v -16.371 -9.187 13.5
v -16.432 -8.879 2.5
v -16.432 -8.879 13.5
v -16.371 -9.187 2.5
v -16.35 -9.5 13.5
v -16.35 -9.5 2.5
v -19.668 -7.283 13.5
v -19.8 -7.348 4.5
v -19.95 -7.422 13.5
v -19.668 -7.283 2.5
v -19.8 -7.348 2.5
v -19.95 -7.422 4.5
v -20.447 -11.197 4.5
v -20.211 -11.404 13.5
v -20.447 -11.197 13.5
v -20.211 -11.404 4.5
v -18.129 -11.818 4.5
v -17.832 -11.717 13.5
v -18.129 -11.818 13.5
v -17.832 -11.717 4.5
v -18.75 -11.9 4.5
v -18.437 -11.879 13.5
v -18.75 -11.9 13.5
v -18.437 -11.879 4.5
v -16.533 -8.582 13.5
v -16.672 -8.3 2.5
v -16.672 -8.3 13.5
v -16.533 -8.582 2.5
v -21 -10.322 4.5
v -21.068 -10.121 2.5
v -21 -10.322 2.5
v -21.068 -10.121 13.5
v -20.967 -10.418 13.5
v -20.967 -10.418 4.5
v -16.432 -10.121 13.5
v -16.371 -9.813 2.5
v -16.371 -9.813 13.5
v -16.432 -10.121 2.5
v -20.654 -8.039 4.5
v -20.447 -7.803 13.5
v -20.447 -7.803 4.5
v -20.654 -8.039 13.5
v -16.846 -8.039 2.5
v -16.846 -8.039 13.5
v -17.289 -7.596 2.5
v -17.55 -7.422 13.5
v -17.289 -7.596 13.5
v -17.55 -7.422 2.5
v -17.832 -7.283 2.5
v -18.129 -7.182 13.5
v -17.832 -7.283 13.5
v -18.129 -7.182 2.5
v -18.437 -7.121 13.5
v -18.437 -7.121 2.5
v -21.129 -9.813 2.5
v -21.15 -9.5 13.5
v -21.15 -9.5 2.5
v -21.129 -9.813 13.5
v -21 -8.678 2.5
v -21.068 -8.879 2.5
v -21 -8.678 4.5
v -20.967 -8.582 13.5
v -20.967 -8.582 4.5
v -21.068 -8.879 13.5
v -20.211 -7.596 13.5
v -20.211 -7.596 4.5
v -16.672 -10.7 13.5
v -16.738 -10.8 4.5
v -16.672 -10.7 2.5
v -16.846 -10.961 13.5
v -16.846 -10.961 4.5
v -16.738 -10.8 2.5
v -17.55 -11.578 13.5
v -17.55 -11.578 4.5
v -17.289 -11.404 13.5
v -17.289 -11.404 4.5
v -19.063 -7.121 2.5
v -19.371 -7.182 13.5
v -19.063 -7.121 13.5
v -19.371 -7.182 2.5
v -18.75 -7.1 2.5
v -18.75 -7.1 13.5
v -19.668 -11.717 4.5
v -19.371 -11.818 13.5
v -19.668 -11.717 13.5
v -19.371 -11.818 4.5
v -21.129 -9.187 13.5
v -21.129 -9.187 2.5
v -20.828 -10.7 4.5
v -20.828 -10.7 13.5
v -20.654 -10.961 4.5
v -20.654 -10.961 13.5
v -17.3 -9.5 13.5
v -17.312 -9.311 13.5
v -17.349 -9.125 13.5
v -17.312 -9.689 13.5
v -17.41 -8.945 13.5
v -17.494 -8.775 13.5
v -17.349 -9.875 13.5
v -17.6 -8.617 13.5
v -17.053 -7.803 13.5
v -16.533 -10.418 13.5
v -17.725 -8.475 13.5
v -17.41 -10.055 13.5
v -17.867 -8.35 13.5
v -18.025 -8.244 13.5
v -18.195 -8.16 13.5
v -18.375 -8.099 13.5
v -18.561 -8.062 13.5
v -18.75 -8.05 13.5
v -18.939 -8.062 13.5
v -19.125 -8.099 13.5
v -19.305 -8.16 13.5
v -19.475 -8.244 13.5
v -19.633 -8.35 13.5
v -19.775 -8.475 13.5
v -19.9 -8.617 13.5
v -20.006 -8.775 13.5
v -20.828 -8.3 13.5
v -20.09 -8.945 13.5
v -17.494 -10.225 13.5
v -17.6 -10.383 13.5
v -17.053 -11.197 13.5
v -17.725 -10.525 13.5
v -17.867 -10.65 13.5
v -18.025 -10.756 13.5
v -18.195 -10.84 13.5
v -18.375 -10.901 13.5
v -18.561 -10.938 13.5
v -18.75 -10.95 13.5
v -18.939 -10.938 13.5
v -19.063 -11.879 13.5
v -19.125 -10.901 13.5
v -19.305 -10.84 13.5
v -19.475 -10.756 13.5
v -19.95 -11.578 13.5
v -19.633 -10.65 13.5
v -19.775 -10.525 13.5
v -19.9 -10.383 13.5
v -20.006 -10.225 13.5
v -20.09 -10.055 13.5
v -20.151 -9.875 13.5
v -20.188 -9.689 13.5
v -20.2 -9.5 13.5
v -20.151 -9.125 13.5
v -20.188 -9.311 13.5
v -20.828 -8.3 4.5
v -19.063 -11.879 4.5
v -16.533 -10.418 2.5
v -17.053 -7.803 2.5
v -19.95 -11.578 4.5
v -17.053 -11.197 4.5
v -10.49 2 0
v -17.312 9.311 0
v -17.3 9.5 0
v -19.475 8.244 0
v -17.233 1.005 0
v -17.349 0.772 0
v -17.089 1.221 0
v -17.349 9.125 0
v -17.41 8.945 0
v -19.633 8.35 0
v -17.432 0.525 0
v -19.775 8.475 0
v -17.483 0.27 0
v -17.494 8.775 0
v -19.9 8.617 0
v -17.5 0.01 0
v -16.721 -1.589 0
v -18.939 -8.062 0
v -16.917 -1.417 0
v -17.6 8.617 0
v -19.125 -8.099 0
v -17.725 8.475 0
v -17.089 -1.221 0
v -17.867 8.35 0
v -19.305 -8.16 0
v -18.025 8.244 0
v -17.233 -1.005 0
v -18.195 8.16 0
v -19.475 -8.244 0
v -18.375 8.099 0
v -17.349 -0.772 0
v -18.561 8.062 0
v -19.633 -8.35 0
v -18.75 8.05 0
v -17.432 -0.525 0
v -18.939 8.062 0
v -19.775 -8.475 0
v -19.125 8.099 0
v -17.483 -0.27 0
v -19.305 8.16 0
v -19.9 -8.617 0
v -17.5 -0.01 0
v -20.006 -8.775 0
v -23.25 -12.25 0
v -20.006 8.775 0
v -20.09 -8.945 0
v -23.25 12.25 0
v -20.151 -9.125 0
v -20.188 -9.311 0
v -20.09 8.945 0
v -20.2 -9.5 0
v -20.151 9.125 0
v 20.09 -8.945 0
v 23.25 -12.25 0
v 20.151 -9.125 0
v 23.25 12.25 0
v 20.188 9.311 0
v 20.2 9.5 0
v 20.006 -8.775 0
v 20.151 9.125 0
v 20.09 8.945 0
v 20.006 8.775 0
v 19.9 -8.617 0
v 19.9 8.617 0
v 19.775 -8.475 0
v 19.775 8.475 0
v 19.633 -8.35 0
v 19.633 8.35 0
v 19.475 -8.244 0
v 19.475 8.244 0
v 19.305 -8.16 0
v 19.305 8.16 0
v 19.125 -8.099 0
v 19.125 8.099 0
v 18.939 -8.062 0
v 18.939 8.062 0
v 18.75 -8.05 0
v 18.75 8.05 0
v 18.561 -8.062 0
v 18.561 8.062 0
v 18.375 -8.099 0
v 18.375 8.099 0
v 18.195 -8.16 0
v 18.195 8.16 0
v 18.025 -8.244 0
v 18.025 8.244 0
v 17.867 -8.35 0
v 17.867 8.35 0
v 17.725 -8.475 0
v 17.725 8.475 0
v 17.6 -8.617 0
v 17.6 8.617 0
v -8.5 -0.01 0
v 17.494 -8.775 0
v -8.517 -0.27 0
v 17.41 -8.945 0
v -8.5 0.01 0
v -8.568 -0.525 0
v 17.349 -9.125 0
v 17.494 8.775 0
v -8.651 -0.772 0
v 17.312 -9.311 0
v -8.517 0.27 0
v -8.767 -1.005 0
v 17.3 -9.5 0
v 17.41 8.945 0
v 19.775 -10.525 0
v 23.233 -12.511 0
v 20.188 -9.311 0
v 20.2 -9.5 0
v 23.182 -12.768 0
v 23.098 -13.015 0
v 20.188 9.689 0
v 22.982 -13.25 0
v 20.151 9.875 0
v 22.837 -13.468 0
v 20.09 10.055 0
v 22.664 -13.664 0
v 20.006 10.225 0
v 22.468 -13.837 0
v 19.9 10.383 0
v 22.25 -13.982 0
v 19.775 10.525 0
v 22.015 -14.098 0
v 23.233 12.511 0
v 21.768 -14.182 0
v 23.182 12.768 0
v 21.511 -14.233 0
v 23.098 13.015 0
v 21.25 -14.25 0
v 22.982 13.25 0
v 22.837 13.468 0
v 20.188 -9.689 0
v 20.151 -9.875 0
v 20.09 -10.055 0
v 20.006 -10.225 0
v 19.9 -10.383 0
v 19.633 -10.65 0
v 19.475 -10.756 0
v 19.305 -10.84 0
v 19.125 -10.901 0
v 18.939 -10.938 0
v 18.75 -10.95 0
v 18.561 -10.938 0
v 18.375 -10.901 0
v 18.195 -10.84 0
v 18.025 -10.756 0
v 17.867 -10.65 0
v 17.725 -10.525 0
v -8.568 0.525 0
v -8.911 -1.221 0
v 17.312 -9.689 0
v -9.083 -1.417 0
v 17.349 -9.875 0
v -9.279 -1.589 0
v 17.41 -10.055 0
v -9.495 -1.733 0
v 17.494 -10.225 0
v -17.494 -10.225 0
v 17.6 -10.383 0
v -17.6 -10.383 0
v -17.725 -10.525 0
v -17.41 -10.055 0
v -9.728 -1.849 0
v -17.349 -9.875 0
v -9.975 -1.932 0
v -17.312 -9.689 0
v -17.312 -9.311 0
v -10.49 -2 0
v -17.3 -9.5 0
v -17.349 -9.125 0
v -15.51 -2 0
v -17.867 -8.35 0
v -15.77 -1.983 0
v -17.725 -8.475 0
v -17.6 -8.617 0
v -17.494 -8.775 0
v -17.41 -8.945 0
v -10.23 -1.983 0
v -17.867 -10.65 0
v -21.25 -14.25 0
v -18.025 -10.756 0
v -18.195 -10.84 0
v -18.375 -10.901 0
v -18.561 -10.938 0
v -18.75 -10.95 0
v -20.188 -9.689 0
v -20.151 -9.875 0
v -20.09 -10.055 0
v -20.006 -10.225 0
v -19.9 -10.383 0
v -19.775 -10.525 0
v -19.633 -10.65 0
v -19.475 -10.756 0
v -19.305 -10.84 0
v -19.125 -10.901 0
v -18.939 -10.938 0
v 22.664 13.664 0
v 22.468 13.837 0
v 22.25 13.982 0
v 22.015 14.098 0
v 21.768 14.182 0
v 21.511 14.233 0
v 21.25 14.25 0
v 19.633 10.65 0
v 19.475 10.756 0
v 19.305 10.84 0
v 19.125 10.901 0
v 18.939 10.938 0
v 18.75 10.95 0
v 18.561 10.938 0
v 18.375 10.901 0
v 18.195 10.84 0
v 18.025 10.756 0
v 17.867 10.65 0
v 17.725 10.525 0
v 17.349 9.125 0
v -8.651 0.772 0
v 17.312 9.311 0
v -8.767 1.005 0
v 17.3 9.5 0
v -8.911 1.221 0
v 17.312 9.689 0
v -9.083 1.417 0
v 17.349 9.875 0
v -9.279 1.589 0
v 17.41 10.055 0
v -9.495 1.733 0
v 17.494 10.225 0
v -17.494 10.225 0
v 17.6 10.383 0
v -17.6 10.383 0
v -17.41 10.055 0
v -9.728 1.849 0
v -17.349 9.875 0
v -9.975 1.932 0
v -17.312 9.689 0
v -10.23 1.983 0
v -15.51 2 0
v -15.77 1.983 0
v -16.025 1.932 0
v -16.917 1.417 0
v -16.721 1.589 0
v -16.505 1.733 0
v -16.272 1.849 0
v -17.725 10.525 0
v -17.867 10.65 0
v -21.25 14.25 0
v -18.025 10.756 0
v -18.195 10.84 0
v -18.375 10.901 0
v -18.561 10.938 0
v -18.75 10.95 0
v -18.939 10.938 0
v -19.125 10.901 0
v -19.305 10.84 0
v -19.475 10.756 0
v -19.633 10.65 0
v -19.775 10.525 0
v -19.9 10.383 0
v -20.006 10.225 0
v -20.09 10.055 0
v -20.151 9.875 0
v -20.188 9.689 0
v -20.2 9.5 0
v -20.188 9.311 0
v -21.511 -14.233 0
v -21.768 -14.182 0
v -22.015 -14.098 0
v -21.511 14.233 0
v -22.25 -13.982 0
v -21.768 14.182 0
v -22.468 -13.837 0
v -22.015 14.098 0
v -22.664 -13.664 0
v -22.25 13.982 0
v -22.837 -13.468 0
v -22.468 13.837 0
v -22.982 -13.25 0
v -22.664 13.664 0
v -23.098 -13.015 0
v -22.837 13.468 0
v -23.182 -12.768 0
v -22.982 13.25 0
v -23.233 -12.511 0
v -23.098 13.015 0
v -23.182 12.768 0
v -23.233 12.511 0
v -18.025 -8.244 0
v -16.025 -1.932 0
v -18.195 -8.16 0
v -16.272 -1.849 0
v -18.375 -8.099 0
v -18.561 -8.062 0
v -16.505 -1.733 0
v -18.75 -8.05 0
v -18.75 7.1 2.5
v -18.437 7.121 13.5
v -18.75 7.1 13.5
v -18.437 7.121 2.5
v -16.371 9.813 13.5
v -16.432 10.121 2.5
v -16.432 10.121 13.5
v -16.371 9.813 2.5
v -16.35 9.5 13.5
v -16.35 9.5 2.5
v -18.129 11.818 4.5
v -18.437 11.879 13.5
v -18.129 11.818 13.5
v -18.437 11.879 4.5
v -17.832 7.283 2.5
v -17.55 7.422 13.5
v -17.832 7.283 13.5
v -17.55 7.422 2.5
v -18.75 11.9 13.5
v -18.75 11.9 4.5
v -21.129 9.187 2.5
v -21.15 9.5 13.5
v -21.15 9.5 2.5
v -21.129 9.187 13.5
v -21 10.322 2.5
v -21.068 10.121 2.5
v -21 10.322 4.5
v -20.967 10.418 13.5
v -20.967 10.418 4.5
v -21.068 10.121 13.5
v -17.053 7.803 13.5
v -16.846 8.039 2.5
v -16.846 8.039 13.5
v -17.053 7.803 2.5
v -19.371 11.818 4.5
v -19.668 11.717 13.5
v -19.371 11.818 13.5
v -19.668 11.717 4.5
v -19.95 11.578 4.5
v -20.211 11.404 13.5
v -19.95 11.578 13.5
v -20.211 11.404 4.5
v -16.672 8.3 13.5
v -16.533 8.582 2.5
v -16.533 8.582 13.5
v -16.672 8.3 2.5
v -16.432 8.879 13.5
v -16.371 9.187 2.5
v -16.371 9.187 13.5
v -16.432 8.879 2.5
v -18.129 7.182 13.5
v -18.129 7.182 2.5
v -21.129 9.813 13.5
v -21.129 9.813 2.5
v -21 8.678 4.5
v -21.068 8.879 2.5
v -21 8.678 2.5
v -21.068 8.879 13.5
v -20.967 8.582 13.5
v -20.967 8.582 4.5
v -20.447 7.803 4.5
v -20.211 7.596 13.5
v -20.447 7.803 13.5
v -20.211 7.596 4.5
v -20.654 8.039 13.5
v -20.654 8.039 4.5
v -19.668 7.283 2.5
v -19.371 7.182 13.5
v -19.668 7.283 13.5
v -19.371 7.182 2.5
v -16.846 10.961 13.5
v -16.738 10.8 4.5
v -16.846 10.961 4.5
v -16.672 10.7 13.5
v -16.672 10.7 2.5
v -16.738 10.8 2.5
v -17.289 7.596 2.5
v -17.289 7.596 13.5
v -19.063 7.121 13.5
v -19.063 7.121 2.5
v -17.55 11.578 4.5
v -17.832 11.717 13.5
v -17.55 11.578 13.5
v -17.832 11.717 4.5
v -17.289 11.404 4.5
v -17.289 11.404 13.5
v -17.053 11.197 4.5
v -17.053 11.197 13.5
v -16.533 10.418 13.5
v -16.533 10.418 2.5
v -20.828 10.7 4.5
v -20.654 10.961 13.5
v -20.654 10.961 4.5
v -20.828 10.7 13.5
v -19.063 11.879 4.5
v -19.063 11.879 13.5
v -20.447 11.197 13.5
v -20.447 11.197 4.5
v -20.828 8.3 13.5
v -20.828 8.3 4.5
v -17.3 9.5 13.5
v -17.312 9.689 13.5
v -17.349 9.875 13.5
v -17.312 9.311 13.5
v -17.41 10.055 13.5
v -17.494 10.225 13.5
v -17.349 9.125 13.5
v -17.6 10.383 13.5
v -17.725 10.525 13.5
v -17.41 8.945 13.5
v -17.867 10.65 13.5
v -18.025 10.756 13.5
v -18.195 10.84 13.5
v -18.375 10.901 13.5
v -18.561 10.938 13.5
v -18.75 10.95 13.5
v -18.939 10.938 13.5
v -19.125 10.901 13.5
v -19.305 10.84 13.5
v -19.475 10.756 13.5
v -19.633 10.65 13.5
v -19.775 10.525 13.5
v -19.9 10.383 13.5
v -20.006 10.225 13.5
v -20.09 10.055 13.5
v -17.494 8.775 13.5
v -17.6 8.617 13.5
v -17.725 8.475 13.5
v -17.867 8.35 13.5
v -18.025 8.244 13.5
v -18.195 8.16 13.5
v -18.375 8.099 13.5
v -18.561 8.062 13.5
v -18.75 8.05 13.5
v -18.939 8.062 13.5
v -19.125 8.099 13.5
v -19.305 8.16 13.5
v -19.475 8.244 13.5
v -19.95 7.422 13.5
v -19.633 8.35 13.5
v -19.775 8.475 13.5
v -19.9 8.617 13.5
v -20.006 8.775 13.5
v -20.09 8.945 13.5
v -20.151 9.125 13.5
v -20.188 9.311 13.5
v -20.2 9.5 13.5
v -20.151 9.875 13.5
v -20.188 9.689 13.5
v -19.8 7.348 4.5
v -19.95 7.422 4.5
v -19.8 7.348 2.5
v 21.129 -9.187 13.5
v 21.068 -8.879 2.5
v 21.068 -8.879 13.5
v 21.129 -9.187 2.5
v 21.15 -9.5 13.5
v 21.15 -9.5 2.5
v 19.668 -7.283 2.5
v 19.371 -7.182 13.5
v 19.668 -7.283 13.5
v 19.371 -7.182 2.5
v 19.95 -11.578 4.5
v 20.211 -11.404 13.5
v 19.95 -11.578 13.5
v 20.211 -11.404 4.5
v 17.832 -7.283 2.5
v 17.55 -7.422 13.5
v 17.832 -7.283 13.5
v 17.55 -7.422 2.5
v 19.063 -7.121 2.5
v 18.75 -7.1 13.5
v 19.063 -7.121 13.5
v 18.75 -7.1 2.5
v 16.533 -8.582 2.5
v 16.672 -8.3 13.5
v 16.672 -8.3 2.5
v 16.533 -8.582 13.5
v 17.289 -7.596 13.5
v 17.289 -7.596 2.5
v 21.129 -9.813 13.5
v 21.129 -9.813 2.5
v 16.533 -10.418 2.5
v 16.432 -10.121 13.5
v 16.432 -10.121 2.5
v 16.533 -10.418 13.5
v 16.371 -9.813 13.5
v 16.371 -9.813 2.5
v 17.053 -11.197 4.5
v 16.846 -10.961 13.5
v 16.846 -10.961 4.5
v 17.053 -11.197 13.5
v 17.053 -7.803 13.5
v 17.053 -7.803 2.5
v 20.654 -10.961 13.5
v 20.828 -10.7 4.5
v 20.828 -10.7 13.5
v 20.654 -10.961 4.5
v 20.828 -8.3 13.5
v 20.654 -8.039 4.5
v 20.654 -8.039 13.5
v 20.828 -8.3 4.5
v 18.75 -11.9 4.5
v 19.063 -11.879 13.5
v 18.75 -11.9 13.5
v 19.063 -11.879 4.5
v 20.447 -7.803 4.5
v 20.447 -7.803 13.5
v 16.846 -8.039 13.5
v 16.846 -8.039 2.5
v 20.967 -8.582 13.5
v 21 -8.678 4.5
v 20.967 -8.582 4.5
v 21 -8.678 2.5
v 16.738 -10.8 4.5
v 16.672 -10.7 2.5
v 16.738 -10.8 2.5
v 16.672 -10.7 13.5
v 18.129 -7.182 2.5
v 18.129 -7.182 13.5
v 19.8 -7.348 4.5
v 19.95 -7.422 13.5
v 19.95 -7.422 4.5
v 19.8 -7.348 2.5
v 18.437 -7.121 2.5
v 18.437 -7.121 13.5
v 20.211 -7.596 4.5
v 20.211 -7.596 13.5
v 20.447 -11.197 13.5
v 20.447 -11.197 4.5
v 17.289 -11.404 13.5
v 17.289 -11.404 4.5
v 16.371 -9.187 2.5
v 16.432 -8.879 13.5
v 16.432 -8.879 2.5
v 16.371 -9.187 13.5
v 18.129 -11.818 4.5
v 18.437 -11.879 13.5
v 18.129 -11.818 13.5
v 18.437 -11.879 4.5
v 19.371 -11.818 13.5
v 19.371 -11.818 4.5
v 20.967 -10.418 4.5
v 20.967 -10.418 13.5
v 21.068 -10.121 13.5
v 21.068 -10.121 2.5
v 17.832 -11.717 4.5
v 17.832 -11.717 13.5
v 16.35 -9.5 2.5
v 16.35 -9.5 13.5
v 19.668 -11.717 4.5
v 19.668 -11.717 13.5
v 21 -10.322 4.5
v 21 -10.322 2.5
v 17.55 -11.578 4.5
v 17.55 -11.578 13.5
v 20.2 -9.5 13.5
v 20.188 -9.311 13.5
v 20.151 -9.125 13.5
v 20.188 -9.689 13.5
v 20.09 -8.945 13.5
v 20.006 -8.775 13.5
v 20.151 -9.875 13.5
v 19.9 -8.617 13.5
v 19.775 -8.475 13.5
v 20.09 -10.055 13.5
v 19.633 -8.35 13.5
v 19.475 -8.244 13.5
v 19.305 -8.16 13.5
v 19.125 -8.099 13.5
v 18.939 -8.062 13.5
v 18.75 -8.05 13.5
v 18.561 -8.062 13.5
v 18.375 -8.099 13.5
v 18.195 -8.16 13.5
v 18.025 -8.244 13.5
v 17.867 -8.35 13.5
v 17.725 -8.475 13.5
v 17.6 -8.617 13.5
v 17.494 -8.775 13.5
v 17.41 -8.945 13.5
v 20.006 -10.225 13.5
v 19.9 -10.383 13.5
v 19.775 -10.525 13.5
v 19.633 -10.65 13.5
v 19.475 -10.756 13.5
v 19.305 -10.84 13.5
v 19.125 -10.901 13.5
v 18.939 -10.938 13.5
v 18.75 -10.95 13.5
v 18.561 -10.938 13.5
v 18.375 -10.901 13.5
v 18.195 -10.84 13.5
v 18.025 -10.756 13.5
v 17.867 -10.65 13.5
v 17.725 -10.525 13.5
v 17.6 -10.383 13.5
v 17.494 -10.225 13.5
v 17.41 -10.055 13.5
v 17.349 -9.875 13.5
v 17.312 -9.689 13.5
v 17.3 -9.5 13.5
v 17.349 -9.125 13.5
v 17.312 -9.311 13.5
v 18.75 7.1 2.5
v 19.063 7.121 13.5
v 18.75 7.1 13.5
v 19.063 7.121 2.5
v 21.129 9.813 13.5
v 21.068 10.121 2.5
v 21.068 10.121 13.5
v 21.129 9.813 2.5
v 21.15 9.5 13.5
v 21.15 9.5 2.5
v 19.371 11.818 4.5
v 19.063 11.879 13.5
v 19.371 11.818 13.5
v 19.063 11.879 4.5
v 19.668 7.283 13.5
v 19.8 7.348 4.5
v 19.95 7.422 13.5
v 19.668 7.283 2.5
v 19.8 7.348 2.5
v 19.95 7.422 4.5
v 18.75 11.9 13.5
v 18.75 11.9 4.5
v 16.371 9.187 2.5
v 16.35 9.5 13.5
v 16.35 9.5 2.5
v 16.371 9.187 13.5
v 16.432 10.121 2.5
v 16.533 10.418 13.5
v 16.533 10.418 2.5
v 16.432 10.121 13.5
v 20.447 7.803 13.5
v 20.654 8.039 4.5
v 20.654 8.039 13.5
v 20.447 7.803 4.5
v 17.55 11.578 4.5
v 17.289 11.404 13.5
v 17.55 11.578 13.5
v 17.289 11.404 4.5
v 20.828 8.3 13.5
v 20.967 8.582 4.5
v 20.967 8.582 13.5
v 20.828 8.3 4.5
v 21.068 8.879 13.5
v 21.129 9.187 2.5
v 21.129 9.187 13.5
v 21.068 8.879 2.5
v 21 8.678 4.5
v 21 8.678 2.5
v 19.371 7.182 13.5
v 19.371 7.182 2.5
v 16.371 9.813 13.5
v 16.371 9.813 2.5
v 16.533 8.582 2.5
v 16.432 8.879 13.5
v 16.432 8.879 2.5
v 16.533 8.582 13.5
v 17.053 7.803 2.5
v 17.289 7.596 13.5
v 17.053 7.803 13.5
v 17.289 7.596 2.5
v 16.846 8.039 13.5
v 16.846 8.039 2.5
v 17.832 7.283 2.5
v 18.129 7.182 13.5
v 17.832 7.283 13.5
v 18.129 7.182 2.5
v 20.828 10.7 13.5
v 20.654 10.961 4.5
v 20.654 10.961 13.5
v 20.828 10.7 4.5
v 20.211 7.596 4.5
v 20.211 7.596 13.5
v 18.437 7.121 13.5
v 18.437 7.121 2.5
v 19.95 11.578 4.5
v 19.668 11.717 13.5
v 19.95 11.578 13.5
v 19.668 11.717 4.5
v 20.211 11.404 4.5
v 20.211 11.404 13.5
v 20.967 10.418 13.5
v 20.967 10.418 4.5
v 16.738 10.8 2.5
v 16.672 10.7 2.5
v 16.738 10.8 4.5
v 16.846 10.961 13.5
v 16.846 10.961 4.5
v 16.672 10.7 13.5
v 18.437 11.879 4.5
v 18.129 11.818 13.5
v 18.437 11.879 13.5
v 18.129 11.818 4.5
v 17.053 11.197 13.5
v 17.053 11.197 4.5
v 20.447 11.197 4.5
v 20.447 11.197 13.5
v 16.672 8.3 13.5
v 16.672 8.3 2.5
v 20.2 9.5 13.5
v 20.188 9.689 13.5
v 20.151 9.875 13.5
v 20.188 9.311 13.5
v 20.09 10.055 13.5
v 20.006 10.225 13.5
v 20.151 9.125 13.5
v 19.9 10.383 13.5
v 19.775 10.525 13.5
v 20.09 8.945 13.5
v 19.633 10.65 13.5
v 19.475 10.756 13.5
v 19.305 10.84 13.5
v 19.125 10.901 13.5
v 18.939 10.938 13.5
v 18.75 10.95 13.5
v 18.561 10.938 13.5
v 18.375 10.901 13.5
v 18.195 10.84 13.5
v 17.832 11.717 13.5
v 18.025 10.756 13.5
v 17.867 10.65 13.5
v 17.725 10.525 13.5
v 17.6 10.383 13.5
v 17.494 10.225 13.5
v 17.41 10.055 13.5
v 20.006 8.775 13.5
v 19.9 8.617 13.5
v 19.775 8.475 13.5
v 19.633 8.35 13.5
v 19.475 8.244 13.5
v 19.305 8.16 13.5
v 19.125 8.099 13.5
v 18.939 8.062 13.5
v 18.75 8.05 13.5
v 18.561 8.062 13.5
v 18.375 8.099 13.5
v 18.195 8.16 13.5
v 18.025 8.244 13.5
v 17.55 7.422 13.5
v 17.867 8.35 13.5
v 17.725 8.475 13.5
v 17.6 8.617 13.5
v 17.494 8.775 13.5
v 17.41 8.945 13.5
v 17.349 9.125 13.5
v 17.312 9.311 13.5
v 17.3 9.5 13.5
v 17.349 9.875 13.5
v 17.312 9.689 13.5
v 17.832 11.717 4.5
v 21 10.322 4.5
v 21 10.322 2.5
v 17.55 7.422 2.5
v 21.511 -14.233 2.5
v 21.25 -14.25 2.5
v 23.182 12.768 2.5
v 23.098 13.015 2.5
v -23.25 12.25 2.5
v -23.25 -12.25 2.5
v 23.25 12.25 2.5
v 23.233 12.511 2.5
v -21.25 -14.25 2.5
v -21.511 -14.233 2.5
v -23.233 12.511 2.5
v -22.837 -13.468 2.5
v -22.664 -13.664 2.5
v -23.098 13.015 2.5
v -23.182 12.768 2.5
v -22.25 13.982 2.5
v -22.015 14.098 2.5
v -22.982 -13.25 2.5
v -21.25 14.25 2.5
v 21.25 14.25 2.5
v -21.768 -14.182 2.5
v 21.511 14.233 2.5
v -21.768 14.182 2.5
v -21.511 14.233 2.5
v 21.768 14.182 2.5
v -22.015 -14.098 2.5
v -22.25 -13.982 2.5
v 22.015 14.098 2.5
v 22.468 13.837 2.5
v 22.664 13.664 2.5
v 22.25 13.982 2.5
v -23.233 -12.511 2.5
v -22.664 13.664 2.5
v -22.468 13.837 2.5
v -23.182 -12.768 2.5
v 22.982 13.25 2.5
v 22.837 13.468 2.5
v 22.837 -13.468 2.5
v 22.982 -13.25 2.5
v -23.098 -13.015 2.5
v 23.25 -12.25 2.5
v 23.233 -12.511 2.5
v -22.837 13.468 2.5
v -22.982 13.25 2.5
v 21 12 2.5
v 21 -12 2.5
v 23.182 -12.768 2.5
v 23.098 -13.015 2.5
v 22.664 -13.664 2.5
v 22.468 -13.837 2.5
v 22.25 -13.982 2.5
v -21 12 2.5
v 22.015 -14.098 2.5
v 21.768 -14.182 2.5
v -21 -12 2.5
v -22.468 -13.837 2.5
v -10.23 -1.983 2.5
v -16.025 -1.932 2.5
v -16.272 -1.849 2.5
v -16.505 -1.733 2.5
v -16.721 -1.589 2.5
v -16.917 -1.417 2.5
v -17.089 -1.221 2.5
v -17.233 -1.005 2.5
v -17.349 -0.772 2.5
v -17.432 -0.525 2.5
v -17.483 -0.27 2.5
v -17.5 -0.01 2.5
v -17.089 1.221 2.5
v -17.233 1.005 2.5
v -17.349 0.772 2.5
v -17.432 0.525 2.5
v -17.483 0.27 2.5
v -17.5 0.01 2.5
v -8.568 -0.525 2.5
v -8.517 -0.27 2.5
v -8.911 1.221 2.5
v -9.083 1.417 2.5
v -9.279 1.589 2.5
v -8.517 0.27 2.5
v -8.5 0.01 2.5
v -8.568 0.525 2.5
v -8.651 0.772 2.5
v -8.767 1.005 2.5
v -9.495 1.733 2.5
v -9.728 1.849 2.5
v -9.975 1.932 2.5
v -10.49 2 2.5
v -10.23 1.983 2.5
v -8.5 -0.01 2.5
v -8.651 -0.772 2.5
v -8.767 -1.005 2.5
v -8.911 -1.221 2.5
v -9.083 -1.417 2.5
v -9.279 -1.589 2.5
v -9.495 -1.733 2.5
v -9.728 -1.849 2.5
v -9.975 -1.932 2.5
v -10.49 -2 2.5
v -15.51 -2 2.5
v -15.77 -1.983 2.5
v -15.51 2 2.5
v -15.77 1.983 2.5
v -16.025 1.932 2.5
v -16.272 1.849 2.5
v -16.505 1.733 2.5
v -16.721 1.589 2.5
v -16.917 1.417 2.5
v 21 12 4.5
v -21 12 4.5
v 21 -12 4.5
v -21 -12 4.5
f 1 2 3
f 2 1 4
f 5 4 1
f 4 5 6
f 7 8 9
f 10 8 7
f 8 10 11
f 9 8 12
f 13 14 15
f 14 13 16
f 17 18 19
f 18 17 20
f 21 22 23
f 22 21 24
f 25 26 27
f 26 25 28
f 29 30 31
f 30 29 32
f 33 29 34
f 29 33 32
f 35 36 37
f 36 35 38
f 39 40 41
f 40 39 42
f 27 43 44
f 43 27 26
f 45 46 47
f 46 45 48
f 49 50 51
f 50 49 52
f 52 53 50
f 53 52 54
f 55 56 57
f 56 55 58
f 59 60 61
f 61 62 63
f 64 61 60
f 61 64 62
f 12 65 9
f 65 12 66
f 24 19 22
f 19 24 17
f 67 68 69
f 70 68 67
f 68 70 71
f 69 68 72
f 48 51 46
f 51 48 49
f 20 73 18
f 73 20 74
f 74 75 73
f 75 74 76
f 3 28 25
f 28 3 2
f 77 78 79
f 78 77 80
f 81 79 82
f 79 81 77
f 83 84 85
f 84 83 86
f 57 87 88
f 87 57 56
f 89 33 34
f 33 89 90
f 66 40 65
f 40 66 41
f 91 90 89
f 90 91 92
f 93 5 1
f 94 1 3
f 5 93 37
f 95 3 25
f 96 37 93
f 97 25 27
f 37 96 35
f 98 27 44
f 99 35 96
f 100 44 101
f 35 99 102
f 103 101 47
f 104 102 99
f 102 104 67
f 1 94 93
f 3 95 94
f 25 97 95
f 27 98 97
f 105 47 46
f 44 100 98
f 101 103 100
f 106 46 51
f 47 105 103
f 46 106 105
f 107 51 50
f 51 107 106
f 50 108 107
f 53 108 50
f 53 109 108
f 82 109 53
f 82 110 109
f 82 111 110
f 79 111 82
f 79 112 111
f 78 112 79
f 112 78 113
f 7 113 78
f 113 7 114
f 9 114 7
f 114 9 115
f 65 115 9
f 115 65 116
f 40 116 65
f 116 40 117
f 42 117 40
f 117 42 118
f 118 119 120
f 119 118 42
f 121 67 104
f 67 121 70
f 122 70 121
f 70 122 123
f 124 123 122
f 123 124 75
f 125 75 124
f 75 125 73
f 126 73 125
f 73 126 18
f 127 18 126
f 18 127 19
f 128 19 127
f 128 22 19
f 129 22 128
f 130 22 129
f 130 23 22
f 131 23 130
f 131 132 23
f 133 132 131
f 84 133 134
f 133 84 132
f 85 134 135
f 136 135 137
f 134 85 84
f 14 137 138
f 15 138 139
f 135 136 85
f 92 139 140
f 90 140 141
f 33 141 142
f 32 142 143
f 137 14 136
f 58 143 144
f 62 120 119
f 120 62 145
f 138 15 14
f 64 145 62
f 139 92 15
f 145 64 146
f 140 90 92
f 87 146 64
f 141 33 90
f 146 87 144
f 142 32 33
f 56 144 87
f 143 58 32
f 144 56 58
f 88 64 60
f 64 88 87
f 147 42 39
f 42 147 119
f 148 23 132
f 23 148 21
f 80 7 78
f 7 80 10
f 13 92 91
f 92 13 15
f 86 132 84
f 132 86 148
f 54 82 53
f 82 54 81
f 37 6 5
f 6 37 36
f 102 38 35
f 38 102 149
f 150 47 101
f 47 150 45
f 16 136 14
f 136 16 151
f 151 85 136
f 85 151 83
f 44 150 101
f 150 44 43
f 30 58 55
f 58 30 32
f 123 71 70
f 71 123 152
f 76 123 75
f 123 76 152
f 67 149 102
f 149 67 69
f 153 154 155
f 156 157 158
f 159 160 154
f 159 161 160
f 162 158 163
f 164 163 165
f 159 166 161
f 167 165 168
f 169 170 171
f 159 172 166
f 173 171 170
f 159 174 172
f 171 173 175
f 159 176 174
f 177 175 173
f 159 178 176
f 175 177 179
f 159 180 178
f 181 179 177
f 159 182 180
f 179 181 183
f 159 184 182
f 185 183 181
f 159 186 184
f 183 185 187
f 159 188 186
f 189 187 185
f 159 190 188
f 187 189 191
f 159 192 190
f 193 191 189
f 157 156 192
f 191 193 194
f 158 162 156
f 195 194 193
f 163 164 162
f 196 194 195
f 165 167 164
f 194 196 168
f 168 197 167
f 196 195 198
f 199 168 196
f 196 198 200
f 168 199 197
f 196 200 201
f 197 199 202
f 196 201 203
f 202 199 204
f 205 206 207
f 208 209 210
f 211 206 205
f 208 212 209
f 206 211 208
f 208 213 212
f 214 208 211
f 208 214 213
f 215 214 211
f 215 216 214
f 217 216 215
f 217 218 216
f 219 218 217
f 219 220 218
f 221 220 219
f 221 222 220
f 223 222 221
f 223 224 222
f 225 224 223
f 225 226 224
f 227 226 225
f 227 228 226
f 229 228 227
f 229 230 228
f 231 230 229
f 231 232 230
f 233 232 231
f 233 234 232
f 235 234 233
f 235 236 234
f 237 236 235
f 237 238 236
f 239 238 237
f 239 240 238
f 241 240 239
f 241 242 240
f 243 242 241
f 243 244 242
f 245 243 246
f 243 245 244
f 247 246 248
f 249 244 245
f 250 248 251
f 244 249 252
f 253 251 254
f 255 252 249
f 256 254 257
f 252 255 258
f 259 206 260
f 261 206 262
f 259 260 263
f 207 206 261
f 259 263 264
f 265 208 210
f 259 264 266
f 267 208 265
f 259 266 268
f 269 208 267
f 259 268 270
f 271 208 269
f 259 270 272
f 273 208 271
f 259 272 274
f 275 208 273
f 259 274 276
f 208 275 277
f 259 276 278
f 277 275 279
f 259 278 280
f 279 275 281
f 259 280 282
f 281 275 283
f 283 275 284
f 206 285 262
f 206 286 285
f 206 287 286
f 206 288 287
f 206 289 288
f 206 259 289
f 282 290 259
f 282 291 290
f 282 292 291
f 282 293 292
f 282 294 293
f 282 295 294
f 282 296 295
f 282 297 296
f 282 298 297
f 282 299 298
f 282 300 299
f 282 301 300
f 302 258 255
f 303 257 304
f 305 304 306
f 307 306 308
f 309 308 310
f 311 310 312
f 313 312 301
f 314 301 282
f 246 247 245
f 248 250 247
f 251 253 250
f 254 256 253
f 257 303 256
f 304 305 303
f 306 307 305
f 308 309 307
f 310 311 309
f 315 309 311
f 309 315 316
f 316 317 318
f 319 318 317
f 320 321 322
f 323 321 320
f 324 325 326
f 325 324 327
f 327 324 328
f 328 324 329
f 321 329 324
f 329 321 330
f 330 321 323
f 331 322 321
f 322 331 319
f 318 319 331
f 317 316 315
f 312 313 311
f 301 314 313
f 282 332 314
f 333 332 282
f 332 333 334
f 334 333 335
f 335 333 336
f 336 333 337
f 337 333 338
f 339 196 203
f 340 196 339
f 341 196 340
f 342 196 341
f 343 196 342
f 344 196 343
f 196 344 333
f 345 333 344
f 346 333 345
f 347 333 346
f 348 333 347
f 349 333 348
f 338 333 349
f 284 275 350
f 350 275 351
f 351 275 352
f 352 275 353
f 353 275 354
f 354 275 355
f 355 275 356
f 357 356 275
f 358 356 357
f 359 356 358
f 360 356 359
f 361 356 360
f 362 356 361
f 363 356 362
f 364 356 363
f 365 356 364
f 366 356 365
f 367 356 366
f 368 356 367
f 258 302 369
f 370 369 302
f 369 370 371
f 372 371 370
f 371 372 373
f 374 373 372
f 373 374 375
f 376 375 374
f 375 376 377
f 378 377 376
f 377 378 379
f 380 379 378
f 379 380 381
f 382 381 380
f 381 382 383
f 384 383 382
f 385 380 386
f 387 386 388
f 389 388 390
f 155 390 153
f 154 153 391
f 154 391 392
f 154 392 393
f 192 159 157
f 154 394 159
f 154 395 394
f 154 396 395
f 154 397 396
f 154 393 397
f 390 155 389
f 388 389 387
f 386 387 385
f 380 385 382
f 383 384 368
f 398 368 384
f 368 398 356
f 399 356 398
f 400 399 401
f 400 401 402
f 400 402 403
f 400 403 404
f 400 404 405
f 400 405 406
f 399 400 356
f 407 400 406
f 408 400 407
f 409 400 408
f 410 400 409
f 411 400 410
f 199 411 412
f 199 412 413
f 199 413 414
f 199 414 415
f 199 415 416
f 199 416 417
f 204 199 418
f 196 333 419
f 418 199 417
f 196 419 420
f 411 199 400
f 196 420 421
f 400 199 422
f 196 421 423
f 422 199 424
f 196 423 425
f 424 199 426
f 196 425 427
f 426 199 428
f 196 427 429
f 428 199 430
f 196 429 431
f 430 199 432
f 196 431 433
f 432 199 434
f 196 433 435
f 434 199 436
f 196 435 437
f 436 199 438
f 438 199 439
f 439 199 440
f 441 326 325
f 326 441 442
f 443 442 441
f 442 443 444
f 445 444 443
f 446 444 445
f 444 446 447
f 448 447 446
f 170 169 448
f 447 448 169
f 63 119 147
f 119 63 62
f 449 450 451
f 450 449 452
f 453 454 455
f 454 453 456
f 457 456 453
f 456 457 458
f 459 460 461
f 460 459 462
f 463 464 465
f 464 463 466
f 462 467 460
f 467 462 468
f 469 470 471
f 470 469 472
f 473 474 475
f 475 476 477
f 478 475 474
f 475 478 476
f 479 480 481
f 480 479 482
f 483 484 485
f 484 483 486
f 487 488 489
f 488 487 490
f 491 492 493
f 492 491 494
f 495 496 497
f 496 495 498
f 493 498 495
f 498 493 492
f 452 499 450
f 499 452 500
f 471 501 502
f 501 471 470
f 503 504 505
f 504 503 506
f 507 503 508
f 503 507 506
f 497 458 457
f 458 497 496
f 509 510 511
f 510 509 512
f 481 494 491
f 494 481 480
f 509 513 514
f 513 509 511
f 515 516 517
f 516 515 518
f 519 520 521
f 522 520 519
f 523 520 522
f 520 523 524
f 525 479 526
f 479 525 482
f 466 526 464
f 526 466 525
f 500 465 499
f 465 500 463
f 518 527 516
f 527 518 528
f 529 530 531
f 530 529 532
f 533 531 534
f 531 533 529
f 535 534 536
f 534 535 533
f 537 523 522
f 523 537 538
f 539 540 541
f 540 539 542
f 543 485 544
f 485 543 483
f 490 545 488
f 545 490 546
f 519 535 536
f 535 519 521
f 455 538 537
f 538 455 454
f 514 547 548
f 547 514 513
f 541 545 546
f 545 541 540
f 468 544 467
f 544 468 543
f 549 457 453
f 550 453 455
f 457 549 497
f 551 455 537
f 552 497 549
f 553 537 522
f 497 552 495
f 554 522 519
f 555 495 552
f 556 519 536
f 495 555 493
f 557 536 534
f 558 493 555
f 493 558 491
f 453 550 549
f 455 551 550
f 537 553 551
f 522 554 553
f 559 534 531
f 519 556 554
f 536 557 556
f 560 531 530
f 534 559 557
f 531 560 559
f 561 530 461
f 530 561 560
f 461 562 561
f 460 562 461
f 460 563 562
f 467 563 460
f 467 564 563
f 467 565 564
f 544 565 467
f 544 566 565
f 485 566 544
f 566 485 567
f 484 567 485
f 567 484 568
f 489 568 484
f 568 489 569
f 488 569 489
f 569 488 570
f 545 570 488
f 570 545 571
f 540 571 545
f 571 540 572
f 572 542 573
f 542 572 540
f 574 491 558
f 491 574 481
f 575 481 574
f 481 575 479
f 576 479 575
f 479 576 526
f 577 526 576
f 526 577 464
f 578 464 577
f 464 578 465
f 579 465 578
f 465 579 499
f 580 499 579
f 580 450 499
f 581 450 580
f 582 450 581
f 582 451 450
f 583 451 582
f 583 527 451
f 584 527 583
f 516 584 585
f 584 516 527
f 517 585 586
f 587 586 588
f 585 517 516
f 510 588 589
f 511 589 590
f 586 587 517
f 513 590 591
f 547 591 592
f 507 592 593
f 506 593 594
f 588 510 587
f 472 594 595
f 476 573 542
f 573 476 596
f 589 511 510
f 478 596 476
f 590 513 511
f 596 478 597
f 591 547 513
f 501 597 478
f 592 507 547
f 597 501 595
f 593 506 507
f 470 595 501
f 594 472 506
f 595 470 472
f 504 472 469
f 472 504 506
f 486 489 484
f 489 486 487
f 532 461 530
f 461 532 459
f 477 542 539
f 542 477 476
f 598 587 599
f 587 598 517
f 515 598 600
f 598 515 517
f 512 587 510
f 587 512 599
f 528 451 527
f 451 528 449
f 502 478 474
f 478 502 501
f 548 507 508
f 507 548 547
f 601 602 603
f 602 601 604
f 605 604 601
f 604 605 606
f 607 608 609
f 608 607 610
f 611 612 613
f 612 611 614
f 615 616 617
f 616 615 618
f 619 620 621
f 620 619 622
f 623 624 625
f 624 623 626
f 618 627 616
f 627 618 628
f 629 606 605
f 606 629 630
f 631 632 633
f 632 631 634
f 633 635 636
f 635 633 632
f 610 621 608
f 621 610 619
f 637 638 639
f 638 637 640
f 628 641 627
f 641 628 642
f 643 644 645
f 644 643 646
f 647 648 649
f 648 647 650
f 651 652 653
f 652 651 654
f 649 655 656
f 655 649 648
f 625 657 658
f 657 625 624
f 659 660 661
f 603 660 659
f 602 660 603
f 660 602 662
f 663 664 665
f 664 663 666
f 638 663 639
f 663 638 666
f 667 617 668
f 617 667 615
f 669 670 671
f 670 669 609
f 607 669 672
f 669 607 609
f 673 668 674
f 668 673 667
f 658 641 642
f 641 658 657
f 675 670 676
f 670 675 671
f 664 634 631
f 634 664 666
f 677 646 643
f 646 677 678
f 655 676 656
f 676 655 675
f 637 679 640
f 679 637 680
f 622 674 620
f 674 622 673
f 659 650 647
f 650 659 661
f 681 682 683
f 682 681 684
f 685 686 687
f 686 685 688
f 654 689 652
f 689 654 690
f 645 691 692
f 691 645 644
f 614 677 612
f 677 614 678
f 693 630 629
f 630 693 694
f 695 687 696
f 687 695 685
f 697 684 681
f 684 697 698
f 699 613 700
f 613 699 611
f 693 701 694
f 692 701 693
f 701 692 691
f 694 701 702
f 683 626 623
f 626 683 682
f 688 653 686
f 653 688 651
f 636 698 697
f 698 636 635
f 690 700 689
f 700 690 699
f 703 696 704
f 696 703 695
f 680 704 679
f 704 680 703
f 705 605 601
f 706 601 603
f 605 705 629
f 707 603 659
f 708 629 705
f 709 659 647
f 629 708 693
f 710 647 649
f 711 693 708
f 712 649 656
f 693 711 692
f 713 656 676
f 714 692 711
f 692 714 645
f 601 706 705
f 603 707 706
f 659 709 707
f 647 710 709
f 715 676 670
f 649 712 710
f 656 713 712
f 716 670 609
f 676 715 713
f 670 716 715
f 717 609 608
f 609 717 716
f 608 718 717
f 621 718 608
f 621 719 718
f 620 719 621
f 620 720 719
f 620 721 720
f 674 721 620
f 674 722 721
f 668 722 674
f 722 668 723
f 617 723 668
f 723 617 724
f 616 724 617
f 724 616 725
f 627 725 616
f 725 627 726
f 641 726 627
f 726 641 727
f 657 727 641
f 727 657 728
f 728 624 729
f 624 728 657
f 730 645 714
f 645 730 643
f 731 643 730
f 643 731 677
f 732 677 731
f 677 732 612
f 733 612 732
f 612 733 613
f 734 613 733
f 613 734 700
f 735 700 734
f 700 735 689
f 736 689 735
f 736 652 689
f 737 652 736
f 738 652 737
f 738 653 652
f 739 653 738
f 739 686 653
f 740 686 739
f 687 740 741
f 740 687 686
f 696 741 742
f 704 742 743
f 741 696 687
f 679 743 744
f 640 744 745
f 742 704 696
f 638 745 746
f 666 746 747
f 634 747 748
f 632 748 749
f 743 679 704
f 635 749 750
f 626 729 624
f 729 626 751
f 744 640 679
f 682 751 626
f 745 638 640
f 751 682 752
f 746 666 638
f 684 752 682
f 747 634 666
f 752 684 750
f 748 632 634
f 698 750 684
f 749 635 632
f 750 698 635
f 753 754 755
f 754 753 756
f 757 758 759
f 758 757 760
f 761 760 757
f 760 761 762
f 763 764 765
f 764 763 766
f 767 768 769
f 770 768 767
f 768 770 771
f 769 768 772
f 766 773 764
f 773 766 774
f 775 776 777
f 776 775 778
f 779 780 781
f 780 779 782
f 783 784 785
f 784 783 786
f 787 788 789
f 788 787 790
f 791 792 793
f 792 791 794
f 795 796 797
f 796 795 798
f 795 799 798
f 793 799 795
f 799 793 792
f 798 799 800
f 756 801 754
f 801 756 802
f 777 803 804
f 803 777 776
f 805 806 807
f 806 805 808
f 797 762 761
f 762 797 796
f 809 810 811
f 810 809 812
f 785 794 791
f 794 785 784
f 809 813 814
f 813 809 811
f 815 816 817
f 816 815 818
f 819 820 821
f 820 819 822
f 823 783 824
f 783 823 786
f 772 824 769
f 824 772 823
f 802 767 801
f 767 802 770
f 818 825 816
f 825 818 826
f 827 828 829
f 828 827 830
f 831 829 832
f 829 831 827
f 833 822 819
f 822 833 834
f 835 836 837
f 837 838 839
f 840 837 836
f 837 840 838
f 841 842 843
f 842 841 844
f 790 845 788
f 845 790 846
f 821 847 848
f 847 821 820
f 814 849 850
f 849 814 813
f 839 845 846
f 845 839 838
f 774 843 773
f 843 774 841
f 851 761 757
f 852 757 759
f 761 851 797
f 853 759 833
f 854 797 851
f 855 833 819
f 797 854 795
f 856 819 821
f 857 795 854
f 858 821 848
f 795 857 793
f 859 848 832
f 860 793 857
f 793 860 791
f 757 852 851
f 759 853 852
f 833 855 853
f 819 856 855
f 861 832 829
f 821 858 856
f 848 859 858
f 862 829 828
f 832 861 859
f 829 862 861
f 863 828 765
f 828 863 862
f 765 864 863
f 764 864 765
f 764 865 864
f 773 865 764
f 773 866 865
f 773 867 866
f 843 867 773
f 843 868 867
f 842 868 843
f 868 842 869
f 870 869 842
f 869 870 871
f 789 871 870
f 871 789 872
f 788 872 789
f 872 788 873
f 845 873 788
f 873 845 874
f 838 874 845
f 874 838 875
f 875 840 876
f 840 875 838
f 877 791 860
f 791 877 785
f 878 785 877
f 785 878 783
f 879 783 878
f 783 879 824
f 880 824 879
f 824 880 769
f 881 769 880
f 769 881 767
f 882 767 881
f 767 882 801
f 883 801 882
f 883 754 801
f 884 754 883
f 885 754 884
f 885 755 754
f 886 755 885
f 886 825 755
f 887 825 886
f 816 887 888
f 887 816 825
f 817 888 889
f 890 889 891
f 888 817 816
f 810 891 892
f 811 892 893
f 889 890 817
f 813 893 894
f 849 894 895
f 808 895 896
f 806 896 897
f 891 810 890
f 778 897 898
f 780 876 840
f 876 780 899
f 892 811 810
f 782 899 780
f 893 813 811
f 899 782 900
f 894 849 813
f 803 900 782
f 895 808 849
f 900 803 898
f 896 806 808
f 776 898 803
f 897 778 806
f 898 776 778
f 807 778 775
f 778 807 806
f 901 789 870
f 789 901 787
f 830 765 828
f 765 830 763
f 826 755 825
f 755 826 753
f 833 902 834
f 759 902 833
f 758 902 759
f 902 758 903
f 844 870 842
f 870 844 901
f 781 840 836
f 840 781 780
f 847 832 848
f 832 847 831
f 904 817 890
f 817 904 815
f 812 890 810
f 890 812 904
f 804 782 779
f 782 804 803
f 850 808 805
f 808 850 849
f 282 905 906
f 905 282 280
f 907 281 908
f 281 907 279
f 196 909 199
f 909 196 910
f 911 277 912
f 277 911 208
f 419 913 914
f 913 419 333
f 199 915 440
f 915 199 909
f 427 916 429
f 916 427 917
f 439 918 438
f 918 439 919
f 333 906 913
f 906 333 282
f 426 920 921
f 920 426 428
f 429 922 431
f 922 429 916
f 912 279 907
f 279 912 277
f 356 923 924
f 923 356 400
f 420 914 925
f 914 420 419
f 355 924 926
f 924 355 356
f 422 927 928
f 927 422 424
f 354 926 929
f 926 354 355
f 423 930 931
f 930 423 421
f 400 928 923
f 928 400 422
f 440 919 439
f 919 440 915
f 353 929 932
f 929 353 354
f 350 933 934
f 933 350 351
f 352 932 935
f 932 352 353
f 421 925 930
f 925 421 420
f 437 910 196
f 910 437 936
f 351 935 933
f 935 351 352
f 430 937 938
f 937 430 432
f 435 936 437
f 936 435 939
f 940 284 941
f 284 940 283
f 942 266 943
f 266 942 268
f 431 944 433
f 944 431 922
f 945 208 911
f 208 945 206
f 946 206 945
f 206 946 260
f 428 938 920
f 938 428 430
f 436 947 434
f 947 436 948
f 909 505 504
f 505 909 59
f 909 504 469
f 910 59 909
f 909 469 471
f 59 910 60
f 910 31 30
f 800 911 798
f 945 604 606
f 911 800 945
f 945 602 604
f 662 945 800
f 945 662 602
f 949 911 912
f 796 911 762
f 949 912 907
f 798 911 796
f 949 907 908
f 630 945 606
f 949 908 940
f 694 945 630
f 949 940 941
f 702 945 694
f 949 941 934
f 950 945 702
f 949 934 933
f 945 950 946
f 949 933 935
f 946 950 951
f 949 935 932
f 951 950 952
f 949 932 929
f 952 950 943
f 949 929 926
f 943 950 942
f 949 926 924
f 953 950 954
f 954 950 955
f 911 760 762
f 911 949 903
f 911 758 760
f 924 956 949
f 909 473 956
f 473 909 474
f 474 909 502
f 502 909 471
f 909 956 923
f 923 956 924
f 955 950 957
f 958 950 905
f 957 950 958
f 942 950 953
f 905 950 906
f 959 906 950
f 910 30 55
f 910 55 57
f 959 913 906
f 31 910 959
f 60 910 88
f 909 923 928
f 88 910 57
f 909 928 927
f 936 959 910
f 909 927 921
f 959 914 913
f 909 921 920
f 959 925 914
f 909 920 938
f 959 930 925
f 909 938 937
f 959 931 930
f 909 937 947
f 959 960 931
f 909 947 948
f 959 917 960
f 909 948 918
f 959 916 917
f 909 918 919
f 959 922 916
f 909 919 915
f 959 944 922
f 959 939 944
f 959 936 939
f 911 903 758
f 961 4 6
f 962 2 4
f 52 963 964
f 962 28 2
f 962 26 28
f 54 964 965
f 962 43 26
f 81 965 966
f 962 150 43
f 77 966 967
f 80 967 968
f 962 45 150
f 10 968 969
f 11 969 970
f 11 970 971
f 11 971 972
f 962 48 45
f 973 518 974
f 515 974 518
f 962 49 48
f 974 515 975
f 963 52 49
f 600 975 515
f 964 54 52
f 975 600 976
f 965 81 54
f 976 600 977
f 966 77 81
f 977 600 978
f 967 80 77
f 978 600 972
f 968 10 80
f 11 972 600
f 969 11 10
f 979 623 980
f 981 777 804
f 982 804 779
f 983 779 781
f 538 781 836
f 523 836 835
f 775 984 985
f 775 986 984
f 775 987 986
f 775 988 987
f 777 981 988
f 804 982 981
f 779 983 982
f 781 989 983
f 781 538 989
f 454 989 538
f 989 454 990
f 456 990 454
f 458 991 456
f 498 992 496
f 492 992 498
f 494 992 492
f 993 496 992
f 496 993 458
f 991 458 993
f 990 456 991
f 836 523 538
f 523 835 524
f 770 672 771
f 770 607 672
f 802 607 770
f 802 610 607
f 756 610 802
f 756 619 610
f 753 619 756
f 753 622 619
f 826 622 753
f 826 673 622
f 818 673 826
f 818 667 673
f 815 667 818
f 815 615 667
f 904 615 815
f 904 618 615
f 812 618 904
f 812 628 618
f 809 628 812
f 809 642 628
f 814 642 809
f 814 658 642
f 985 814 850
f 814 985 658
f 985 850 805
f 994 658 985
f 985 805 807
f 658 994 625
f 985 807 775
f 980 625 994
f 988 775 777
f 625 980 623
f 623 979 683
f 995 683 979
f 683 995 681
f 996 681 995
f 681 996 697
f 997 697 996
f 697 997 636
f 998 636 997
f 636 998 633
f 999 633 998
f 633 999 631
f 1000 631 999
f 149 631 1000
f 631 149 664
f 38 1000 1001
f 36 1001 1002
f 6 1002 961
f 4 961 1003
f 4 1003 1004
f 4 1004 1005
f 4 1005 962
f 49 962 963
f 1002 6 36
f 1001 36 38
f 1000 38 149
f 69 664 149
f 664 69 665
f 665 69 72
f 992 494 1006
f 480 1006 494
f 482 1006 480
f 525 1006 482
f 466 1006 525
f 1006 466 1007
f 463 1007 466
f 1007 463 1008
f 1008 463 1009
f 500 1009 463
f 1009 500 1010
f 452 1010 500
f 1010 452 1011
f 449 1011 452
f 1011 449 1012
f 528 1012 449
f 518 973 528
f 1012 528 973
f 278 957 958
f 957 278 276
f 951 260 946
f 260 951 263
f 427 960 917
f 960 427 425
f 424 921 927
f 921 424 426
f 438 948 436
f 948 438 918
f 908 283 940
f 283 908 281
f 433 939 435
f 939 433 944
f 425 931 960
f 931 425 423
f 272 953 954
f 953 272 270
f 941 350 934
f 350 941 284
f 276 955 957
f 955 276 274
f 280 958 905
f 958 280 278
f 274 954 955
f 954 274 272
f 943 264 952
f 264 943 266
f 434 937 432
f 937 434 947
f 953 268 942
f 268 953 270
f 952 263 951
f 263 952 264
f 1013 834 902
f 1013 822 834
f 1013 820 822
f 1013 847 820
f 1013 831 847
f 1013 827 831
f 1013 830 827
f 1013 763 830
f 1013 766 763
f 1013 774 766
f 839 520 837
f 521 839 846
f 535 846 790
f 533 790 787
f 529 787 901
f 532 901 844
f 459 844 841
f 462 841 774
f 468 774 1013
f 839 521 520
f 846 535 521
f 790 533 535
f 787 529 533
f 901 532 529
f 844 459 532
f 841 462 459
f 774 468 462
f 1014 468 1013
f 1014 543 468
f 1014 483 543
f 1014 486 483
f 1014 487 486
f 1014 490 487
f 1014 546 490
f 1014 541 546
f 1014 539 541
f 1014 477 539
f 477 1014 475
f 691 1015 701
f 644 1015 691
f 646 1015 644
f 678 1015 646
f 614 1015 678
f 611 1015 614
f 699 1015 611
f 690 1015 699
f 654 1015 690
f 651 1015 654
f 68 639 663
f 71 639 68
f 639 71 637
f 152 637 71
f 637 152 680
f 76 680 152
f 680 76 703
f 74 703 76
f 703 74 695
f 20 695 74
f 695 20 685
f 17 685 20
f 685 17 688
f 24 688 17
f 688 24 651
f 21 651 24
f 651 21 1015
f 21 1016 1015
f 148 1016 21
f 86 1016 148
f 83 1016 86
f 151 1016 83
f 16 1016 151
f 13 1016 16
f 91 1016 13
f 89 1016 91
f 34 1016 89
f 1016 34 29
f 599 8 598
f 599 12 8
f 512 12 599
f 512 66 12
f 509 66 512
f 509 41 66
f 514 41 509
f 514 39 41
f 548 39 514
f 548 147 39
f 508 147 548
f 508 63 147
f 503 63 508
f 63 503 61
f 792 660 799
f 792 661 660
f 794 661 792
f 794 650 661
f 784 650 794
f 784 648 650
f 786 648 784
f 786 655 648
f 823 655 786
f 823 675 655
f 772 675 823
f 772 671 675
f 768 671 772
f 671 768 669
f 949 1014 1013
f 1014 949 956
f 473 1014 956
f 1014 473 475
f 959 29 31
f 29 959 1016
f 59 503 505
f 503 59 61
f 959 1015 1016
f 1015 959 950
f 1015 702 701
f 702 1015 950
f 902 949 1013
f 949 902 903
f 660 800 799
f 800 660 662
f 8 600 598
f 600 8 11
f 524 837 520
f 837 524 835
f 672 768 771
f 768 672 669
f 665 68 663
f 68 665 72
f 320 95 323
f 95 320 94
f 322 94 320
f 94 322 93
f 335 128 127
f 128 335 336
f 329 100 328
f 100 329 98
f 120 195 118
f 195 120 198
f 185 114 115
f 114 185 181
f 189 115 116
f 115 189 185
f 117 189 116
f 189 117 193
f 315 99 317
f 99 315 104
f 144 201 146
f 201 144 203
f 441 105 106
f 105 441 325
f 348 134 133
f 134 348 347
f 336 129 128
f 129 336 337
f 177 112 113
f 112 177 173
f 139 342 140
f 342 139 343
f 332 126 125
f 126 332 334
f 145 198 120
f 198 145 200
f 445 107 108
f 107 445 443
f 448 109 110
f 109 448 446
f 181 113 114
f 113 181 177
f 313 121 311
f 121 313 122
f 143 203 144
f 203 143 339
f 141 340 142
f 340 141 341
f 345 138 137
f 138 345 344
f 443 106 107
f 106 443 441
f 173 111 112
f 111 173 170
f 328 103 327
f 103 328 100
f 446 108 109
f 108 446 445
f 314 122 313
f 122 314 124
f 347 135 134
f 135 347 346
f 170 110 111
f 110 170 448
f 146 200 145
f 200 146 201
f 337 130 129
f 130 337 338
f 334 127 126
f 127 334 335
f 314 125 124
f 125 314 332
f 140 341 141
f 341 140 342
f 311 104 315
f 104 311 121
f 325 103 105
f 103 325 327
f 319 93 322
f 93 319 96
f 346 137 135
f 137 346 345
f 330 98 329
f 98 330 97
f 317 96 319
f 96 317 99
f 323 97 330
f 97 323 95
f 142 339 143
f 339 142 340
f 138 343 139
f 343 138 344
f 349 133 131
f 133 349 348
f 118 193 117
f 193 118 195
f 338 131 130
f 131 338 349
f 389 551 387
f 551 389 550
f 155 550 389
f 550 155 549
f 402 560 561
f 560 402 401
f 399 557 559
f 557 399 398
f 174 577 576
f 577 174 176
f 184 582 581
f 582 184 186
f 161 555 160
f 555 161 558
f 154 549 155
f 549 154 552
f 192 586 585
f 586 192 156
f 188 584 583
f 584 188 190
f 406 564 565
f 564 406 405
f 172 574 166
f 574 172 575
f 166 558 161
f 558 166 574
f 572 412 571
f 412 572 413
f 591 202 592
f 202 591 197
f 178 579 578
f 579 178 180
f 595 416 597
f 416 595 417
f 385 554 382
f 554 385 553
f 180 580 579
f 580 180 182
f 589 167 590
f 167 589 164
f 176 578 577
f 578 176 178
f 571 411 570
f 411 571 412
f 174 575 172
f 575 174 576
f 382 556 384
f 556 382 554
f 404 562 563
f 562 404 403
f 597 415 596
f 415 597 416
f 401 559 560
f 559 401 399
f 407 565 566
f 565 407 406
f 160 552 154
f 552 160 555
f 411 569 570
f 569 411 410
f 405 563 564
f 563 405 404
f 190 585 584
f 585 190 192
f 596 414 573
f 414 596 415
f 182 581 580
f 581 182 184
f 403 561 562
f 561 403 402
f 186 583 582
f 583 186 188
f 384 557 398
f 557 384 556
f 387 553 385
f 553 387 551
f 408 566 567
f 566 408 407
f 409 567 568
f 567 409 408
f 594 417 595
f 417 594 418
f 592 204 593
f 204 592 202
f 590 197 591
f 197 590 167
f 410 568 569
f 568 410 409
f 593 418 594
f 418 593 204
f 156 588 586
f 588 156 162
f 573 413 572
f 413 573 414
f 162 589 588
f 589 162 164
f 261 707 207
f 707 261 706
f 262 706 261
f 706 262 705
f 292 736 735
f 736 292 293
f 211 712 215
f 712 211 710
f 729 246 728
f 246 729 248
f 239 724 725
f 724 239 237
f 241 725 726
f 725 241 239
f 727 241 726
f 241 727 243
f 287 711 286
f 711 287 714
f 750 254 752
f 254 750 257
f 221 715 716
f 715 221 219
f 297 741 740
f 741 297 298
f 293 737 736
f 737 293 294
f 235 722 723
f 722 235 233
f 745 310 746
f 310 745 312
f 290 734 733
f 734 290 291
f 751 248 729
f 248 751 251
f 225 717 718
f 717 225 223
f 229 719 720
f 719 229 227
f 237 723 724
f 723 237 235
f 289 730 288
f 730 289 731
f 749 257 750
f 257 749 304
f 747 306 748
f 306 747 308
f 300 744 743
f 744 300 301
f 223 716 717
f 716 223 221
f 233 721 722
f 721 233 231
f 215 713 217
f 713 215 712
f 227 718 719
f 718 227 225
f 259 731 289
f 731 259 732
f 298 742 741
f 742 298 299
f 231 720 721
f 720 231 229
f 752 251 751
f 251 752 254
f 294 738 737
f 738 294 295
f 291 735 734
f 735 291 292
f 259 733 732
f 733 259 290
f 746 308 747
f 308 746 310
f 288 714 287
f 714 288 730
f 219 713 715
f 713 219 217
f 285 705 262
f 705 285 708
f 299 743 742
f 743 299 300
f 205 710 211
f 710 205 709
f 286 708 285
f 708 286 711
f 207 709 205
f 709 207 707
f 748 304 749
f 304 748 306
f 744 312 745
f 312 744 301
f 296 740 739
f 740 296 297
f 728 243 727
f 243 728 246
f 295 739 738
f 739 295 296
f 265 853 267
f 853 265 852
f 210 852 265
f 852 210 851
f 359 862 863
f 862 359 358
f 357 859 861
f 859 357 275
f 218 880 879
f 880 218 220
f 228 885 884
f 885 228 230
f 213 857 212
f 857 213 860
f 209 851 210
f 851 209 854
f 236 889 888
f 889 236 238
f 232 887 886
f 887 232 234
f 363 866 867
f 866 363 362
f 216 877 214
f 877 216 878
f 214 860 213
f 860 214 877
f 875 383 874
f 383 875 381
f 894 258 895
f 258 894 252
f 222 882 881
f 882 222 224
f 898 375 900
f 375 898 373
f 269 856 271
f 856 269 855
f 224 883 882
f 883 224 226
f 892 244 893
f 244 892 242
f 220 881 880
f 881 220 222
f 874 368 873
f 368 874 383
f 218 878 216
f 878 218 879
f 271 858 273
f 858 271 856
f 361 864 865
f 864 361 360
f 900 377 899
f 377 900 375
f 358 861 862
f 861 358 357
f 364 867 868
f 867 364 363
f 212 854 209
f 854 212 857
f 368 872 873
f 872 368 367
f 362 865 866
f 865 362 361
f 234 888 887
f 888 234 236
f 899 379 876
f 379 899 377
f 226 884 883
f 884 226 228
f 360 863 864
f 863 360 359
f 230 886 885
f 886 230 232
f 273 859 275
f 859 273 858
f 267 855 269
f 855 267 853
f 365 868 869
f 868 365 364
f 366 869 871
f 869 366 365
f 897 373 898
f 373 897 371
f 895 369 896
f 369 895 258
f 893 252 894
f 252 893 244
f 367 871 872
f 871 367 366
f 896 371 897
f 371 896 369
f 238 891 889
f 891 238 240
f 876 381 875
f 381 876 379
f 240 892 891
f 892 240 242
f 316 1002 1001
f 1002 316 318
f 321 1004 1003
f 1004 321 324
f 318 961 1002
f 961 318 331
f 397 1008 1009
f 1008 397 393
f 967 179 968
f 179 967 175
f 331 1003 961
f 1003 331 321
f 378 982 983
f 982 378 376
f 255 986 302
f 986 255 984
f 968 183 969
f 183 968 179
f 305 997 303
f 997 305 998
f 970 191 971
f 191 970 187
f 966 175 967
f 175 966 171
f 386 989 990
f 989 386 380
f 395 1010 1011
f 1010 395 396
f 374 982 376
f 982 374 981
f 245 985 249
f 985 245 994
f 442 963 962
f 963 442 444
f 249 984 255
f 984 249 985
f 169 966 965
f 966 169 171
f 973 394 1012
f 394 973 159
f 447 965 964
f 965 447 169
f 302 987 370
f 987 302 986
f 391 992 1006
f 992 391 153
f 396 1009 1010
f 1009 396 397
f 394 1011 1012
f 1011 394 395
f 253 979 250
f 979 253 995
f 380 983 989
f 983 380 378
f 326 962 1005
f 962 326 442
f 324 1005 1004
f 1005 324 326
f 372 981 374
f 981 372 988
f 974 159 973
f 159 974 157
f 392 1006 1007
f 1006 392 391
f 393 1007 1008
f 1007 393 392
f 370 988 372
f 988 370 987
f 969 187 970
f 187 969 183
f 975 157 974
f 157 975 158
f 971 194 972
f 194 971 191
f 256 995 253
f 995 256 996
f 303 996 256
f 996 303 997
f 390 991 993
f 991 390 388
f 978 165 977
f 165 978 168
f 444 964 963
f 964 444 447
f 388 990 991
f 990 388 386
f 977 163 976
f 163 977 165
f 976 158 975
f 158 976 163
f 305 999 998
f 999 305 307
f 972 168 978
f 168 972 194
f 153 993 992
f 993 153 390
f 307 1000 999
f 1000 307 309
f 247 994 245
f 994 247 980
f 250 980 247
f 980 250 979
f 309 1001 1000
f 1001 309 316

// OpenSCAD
// file: model.scad
// Small enclosure for the segment display module (the one on the halmet tier).
// Two prints. The shell prints face down: its outer front face is z = 0, the
// display looks out through a window, and the board screws up against four
// posts. The back cover (part-back.scad) closes it; its four tubes press on the
// board's back, and four M2.5 x 20 self-tappers go cover -> tube -> board -> post.

/* [Board] (calipers, owner) */
board_l = 41.5;
board_w = 23.5;
board_t = 1.6;       // guessed, standard PCB
hole_dx = 37.5;      // centre to centre, long side
hole_dy = 19;        // centre to centre, short side
hole_d = 2.8;

/* [Display] (calipers, owner) */
disp_l = 30;
disp_w = 14;
disp_h = 7;          // display face above the board's front
disp_dx = 0;         // display centre off board centre; guessed centred
disp_dy = 0;
disp_recess = 0.5;   // display face sits this far behind the shell's outer face
window_clear = 0.3;  // per side around the display body

/* [Shell] */
wall = 2;
face_t = 2;
board_clear = 0.5;   // per side, board edge to inner wall
corner_r = 2;
post_d = 5.6;         // fuses into the walls
pilot_d = 2.2;       // M2.5 self-tapping into plastic, calibration pending
rear_clear = 11;     // board back to cover; header pins and wires live here

/* [Back cover] */
cover_t = 2.5;
lip_h = 2;
lip_t = 1.2;
lip_clear = 0.25;    // per side, guessed, unmeasured fit
tube_d = 4.8;
screw_clear_d = 2.9;
cable_l = 9;         // cable slot through the cover, at the -X end
cable_w = 4;
cable_x = -13;

part = "shell";      // shell | back | assembly

/* [Hidden] */
$fn = 48;
in_l = board_l + 2*board_clear;
in_w = board_w + 2*board_clear;
out_l = in_l + 2*wall;
out_w = in_w + 2*wall;
board_z = disp_recess + disp_h;            // board front face
shell_h = board_z + board_t + rear_clear;  // rim
holes = [for (sx = [-1, 1], sy = [-1, 1]) [sx*hole_dx/2, sy*hole_dy/2]];

module rrect(l, w, r) { offset(r = r) square([l - 2*r, w - 2*r], center = true); }

module shell() {
    difference() {
        union() {
            difference() {
                linear_extrude(shell_h) rrect(out_l, out_w, corner_r);
                translate([0, 0, face_t]) linear_extrude(shell_h) square([in_l, in_w], center = true);
            }
            for (h = holes) translate([h[0], h[1], 0]) cylinder(d = post_d, h = board_z);
        }
        translate([disp_dx, disp_dy, -1])
            linear_extrude(face_t + 2) square([disp_l + 2*window_clear, disp_w + 2*window_clear], center = true);
        for (h = holes) translate([h[0], h[1], face_t - 1]) cylinder(d = pilot_d, h = board_z);
    }
}

// Back cover, modelled as printed: outer face on the bed, lip and tubes up.
module back() {
    difference() {
        union() {
            linear_extrude(cover_t) rrect(out_l, out_w, corner_r);
            translate([0, 0, cover_t]) linear_extrude(lip_h) difference() {
                square([in_l - 2*lip_clear, in_w - 2*lip_clear], center = true);
                square([in_l - 2*lip_clear - 2*lip_t, in_w - 2*lip_clear - 2*lip_t], center = true);
            }
            for (h = holes) translate([h[0], h[1], 0]) cylinder(d = tube_d, h = cover_t + rear_clear);
        }
        for (h = holes) translate([h[0], h[1], -1]) cylinder(d = screw_clear_d, h = cover_t + rear_clear + 2);
        translate([cable_x, 0, -1]) linear_extrude(cover_t + lip_h + 2) rrect(cable_l, cable_w, cable_w/2 - 0.01);
    }
}

module board() {
    color("darkgreen") translate([0, 0, board_z]) linear_extrude(board_t) difference() {
        square([board_l, board_w], center = true);
        for (h = holes) translate(h) circle(d = hole_d);
    }
    color("dimgray") translate([disp_dx, disp_dy, disp_recess]) linear_extrude(disp_h) square([disp_l, disp_w], center = true);
}

if (part == "shell") shell();
else if (part == "back") back();
else {
    shell();
    %board();
    translate([0, 0, shell_h + cover_t]) mirror([0, 0, 1]) back();
}
// main file
// Back cover: built from model.scad as its own part.
include <model.scad>
part = "back";
